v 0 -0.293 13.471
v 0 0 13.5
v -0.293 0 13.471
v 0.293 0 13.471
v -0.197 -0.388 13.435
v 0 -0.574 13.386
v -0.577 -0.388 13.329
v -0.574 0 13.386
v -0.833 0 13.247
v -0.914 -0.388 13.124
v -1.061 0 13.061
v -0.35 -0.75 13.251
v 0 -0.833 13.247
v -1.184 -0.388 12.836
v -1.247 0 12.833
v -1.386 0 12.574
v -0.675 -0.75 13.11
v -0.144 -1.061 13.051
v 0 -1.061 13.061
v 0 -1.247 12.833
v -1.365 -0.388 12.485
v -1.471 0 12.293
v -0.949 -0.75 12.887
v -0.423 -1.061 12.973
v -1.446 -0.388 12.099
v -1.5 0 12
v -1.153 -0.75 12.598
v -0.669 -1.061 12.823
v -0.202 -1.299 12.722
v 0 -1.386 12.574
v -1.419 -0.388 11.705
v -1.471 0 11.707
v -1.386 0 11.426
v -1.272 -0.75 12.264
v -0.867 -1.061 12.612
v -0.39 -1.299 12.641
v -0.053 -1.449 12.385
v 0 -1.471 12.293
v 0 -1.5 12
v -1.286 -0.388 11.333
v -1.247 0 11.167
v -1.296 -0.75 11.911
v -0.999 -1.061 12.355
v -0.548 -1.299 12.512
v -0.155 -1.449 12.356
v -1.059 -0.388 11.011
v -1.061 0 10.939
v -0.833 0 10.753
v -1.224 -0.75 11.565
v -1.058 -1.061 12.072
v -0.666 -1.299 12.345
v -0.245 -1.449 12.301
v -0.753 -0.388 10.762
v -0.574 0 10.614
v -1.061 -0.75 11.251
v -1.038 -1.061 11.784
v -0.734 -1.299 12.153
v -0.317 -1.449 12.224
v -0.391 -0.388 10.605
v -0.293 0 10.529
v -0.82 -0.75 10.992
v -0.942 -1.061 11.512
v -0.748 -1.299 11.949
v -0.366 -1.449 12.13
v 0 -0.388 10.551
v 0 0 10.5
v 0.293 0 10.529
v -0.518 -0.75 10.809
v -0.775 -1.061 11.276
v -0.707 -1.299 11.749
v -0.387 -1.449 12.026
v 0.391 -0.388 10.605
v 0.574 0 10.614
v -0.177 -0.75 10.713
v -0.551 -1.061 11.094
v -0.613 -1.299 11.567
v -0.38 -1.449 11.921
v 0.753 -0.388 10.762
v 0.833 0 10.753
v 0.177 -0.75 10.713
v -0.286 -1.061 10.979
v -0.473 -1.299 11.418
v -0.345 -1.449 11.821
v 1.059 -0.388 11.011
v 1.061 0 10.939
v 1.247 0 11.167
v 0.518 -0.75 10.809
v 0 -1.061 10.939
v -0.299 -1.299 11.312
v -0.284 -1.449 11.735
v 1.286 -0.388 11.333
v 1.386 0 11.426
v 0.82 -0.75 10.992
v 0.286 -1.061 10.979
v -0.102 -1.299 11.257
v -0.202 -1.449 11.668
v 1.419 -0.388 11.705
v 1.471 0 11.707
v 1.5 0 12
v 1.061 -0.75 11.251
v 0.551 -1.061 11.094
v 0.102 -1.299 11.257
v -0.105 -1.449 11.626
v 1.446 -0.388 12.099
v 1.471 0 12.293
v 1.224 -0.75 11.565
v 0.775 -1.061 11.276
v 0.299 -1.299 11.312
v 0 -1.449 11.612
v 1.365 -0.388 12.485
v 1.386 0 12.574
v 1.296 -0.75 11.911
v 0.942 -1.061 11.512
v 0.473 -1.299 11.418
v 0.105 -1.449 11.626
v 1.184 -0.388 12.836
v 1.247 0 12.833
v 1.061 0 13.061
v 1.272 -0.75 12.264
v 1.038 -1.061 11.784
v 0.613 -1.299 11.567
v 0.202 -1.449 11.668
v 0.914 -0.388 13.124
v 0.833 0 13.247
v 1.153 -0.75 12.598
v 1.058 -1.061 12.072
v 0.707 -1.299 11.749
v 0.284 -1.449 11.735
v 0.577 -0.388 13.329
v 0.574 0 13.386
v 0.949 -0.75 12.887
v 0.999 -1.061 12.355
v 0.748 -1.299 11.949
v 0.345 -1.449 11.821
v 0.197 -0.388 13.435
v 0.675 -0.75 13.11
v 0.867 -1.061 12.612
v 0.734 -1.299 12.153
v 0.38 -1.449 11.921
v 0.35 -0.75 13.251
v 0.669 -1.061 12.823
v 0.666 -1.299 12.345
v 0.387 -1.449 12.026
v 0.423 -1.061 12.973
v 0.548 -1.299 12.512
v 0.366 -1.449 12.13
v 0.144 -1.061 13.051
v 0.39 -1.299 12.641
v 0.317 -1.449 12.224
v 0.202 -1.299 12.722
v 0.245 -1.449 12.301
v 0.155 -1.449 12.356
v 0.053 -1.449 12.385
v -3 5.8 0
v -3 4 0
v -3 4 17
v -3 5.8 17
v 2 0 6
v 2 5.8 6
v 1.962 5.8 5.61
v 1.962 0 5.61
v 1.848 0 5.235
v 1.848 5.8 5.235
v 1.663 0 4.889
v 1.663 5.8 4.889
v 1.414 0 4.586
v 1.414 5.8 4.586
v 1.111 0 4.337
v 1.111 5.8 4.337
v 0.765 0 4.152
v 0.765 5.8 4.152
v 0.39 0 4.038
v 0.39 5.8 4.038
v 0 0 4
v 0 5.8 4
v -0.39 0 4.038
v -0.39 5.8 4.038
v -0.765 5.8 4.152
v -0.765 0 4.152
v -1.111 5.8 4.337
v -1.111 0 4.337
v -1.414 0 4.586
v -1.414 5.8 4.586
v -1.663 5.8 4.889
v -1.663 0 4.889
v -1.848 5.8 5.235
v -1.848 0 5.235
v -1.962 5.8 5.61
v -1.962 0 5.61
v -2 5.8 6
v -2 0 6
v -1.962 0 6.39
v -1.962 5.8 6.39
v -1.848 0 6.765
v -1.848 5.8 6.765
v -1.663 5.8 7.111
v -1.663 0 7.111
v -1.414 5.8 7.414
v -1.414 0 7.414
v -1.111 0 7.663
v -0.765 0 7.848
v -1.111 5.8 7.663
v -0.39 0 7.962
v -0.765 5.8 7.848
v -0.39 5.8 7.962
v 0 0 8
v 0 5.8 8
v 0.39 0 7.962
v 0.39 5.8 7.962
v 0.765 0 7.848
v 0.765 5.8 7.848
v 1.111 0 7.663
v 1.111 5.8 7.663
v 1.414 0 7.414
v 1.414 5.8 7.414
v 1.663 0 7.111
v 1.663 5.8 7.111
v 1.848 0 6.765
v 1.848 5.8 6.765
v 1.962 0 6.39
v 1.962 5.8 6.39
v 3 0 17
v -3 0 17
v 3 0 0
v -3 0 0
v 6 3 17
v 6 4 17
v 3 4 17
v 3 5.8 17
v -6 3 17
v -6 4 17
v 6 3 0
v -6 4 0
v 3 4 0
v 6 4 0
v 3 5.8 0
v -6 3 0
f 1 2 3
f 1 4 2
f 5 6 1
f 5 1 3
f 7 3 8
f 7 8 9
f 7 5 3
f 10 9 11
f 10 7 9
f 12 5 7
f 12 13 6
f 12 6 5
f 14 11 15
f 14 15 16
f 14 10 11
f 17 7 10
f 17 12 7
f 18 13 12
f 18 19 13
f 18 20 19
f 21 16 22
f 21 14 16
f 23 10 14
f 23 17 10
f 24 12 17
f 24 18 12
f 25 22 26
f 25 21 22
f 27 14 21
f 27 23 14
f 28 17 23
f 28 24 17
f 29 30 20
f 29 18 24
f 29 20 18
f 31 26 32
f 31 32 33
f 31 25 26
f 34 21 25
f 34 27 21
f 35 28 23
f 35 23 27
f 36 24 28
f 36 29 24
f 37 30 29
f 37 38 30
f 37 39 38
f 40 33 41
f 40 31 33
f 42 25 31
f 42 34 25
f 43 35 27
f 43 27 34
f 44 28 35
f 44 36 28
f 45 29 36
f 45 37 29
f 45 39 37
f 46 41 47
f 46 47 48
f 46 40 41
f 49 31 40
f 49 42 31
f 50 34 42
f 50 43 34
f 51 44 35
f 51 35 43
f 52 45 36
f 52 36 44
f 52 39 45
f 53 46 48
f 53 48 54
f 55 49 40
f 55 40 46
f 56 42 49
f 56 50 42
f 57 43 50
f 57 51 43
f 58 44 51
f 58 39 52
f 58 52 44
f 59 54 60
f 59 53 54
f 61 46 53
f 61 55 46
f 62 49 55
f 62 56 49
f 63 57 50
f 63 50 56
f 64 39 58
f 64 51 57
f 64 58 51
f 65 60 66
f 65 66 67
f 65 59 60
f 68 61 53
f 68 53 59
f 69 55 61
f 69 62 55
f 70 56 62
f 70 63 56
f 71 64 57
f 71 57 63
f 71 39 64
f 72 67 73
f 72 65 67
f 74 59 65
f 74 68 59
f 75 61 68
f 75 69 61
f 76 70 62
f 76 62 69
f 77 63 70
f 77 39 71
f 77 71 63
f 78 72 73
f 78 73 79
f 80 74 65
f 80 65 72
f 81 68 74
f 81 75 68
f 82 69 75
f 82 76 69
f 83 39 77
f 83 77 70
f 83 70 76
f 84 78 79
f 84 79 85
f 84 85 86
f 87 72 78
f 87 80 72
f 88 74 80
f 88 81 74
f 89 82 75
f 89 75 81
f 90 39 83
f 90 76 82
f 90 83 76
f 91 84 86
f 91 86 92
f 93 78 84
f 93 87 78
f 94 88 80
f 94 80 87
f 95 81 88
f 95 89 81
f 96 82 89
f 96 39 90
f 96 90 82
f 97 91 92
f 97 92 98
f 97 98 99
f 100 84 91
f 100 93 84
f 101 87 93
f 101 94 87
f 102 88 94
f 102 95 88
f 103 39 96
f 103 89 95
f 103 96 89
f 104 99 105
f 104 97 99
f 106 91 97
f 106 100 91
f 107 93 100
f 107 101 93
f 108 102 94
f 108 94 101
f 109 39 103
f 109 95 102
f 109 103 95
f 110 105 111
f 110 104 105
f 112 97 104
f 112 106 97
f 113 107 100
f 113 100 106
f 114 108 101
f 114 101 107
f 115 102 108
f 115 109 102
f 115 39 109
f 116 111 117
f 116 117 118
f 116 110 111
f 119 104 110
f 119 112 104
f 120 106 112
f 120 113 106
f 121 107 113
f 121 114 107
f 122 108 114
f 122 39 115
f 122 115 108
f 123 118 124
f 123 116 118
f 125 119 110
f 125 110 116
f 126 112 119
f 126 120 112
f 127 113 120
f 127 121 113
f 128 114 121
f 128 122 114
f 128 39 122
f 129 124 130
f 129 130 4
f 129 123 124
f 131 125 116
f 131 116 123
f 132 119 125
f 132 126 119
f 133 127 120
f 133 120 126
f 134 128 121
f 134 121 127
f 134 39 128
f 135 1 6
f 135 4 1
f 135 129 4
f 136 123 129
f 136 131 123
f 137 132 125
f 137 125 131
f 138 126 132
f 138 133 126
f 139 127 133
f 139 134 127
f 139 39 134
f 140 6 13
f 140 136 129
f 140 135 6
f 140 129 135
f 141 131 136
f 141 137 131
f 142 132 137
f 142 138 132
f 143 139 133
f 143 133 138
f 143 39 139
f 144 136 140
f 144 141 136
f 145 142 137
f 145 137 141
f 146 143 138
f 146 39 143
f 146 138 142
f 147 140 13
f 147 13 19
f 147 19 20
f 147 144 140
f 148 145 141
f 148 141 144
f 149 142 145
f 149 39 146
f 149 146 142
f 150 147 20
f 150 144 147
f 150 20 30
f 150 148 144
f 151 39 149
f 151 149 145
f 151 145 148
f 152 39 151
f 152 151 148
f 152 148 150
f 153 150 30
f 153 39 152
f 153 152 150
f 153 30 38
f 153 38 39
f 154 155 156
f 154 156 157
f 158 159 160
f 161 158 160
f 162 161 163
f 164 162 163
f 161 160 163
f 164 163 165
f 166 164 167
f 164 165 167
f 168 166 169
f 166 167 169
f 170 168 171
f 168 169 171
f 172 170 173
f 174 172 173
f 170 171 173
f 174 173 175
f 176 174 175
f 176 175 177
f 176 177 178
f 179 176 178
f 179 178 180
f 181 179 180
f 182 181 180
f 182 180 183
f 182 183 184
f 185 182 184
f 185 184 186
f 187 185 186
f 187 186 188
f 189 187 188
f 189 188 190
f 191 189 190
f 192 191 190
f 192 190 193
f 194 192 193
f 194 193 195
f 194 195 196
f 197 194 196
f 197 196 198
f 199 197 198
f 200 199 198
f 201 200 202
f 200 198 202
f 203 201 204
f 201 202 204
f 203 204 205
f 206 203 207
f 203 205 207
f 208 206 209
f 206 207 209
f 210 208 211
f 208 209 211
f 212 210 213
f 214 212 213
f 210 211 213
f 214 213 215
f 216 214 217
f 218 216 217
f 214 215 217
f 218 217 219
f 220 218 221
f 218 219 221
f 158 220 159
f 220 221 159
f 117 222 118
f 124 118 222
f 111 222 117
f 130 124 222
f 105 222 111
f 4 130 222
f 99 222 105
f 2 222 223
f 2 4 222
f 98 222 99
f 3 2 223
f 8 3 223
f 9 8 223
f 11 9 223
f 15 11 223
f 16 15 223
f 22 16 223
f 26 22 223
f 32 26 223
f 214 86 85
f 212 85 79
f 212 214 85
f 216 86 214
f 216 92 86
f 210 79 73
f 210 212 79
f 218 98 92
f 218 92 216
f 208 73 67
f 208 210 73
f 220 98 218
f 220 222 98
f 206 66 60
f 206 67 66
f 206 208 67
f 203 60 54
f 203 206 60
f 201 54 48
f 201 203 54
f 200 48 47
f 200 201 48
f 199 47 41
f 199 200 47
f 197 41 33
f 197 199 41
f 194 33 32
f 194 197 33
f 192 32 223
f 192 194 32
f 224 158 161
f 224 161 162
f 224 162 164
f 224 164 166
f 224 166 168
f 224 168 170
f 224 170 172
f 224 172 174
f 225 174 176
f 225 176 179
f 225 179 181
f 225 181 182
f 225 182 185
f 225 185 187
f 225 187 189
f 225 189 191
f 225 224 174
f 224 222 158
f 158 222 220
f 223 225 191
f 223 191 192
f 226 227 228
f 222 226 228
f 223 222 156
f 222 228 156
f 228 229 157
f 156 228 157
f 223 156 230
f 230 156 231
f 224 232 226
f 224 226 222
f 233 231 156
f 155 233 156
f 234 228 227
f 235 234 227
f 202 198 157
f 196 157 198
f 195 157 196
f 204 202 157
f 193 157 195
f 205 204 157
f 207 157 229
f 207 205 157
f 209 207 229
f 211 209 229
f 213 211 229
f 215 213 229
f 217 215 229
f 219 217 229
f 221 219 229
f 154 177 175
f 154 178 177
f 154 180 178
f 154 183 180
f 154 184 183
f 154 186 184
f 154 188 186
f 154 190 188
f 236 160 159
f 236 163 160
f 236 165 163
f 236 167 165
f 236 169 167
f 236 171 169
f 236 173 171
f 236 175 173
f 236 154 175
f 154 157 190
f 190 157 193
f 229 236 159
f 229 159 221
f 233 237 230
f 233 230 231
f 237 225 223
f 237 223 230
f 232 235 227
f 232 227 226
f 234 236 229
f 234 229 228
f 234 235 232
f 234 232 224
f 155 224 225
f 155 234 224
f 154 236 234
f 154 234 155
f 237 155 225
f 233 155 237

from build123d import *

# Parameters (mm, degrees)
ESTRUSIONE_ESTRUSIONE1_DEPTH = 17
SCHIZZO2_R                   = 2
TAGLIO_ESTRUSIONE1_DEPTH     = 6.8


with BuildPart() as part:
    # Schizzo1 → Estrusione-Estrusione1 (new body)
    with BuildSketch(Plane.XY):
        Polygon((3, 0), (-3, 0), (-6, 3), (-6, 4), (-3, 4), (-3, 5.8), (3, 5.8), (3, 4), (6, 4), (6, 3), align=None)
    extrude(amount=ESTRUSIONE_ESTRUSIONE1_DEPTH)

    # Schizzo2 → Taglio-Estrusione1 (cut, through all)
    with BuildSketch(Plane(origin=(0, 5.8, 0), x_dir=(1, 0, 0), z_dir=(0, 1, 0))):
        with Locations((0, -6)):
            Circle(SCHIZZO2_R)
    extrude(amount=-TAGLIO_ESTRUSIONE1_DEPTH, mode=Mode.SUBTRACT)

    # Schizzo4 → Rivoluzione2 (revolve)
    with BuildSketch(Plane(origin=(0, 0, 0), x_dir=(0, 0, -1), z_dir=(1, 0, 0))):
        with BuildLine():
            Line((-12, -1.5), (-12, 0))
            Line((-12, 0), (-13.5, 0))
            ThreePointArc((-13.5, 0), (-13.060660172, -1.060660172), (-12, -1.5))
        make_face()
    revolve(axis=Axis((0, 0, 12), (0, -1, 0)))


solid = part.part
